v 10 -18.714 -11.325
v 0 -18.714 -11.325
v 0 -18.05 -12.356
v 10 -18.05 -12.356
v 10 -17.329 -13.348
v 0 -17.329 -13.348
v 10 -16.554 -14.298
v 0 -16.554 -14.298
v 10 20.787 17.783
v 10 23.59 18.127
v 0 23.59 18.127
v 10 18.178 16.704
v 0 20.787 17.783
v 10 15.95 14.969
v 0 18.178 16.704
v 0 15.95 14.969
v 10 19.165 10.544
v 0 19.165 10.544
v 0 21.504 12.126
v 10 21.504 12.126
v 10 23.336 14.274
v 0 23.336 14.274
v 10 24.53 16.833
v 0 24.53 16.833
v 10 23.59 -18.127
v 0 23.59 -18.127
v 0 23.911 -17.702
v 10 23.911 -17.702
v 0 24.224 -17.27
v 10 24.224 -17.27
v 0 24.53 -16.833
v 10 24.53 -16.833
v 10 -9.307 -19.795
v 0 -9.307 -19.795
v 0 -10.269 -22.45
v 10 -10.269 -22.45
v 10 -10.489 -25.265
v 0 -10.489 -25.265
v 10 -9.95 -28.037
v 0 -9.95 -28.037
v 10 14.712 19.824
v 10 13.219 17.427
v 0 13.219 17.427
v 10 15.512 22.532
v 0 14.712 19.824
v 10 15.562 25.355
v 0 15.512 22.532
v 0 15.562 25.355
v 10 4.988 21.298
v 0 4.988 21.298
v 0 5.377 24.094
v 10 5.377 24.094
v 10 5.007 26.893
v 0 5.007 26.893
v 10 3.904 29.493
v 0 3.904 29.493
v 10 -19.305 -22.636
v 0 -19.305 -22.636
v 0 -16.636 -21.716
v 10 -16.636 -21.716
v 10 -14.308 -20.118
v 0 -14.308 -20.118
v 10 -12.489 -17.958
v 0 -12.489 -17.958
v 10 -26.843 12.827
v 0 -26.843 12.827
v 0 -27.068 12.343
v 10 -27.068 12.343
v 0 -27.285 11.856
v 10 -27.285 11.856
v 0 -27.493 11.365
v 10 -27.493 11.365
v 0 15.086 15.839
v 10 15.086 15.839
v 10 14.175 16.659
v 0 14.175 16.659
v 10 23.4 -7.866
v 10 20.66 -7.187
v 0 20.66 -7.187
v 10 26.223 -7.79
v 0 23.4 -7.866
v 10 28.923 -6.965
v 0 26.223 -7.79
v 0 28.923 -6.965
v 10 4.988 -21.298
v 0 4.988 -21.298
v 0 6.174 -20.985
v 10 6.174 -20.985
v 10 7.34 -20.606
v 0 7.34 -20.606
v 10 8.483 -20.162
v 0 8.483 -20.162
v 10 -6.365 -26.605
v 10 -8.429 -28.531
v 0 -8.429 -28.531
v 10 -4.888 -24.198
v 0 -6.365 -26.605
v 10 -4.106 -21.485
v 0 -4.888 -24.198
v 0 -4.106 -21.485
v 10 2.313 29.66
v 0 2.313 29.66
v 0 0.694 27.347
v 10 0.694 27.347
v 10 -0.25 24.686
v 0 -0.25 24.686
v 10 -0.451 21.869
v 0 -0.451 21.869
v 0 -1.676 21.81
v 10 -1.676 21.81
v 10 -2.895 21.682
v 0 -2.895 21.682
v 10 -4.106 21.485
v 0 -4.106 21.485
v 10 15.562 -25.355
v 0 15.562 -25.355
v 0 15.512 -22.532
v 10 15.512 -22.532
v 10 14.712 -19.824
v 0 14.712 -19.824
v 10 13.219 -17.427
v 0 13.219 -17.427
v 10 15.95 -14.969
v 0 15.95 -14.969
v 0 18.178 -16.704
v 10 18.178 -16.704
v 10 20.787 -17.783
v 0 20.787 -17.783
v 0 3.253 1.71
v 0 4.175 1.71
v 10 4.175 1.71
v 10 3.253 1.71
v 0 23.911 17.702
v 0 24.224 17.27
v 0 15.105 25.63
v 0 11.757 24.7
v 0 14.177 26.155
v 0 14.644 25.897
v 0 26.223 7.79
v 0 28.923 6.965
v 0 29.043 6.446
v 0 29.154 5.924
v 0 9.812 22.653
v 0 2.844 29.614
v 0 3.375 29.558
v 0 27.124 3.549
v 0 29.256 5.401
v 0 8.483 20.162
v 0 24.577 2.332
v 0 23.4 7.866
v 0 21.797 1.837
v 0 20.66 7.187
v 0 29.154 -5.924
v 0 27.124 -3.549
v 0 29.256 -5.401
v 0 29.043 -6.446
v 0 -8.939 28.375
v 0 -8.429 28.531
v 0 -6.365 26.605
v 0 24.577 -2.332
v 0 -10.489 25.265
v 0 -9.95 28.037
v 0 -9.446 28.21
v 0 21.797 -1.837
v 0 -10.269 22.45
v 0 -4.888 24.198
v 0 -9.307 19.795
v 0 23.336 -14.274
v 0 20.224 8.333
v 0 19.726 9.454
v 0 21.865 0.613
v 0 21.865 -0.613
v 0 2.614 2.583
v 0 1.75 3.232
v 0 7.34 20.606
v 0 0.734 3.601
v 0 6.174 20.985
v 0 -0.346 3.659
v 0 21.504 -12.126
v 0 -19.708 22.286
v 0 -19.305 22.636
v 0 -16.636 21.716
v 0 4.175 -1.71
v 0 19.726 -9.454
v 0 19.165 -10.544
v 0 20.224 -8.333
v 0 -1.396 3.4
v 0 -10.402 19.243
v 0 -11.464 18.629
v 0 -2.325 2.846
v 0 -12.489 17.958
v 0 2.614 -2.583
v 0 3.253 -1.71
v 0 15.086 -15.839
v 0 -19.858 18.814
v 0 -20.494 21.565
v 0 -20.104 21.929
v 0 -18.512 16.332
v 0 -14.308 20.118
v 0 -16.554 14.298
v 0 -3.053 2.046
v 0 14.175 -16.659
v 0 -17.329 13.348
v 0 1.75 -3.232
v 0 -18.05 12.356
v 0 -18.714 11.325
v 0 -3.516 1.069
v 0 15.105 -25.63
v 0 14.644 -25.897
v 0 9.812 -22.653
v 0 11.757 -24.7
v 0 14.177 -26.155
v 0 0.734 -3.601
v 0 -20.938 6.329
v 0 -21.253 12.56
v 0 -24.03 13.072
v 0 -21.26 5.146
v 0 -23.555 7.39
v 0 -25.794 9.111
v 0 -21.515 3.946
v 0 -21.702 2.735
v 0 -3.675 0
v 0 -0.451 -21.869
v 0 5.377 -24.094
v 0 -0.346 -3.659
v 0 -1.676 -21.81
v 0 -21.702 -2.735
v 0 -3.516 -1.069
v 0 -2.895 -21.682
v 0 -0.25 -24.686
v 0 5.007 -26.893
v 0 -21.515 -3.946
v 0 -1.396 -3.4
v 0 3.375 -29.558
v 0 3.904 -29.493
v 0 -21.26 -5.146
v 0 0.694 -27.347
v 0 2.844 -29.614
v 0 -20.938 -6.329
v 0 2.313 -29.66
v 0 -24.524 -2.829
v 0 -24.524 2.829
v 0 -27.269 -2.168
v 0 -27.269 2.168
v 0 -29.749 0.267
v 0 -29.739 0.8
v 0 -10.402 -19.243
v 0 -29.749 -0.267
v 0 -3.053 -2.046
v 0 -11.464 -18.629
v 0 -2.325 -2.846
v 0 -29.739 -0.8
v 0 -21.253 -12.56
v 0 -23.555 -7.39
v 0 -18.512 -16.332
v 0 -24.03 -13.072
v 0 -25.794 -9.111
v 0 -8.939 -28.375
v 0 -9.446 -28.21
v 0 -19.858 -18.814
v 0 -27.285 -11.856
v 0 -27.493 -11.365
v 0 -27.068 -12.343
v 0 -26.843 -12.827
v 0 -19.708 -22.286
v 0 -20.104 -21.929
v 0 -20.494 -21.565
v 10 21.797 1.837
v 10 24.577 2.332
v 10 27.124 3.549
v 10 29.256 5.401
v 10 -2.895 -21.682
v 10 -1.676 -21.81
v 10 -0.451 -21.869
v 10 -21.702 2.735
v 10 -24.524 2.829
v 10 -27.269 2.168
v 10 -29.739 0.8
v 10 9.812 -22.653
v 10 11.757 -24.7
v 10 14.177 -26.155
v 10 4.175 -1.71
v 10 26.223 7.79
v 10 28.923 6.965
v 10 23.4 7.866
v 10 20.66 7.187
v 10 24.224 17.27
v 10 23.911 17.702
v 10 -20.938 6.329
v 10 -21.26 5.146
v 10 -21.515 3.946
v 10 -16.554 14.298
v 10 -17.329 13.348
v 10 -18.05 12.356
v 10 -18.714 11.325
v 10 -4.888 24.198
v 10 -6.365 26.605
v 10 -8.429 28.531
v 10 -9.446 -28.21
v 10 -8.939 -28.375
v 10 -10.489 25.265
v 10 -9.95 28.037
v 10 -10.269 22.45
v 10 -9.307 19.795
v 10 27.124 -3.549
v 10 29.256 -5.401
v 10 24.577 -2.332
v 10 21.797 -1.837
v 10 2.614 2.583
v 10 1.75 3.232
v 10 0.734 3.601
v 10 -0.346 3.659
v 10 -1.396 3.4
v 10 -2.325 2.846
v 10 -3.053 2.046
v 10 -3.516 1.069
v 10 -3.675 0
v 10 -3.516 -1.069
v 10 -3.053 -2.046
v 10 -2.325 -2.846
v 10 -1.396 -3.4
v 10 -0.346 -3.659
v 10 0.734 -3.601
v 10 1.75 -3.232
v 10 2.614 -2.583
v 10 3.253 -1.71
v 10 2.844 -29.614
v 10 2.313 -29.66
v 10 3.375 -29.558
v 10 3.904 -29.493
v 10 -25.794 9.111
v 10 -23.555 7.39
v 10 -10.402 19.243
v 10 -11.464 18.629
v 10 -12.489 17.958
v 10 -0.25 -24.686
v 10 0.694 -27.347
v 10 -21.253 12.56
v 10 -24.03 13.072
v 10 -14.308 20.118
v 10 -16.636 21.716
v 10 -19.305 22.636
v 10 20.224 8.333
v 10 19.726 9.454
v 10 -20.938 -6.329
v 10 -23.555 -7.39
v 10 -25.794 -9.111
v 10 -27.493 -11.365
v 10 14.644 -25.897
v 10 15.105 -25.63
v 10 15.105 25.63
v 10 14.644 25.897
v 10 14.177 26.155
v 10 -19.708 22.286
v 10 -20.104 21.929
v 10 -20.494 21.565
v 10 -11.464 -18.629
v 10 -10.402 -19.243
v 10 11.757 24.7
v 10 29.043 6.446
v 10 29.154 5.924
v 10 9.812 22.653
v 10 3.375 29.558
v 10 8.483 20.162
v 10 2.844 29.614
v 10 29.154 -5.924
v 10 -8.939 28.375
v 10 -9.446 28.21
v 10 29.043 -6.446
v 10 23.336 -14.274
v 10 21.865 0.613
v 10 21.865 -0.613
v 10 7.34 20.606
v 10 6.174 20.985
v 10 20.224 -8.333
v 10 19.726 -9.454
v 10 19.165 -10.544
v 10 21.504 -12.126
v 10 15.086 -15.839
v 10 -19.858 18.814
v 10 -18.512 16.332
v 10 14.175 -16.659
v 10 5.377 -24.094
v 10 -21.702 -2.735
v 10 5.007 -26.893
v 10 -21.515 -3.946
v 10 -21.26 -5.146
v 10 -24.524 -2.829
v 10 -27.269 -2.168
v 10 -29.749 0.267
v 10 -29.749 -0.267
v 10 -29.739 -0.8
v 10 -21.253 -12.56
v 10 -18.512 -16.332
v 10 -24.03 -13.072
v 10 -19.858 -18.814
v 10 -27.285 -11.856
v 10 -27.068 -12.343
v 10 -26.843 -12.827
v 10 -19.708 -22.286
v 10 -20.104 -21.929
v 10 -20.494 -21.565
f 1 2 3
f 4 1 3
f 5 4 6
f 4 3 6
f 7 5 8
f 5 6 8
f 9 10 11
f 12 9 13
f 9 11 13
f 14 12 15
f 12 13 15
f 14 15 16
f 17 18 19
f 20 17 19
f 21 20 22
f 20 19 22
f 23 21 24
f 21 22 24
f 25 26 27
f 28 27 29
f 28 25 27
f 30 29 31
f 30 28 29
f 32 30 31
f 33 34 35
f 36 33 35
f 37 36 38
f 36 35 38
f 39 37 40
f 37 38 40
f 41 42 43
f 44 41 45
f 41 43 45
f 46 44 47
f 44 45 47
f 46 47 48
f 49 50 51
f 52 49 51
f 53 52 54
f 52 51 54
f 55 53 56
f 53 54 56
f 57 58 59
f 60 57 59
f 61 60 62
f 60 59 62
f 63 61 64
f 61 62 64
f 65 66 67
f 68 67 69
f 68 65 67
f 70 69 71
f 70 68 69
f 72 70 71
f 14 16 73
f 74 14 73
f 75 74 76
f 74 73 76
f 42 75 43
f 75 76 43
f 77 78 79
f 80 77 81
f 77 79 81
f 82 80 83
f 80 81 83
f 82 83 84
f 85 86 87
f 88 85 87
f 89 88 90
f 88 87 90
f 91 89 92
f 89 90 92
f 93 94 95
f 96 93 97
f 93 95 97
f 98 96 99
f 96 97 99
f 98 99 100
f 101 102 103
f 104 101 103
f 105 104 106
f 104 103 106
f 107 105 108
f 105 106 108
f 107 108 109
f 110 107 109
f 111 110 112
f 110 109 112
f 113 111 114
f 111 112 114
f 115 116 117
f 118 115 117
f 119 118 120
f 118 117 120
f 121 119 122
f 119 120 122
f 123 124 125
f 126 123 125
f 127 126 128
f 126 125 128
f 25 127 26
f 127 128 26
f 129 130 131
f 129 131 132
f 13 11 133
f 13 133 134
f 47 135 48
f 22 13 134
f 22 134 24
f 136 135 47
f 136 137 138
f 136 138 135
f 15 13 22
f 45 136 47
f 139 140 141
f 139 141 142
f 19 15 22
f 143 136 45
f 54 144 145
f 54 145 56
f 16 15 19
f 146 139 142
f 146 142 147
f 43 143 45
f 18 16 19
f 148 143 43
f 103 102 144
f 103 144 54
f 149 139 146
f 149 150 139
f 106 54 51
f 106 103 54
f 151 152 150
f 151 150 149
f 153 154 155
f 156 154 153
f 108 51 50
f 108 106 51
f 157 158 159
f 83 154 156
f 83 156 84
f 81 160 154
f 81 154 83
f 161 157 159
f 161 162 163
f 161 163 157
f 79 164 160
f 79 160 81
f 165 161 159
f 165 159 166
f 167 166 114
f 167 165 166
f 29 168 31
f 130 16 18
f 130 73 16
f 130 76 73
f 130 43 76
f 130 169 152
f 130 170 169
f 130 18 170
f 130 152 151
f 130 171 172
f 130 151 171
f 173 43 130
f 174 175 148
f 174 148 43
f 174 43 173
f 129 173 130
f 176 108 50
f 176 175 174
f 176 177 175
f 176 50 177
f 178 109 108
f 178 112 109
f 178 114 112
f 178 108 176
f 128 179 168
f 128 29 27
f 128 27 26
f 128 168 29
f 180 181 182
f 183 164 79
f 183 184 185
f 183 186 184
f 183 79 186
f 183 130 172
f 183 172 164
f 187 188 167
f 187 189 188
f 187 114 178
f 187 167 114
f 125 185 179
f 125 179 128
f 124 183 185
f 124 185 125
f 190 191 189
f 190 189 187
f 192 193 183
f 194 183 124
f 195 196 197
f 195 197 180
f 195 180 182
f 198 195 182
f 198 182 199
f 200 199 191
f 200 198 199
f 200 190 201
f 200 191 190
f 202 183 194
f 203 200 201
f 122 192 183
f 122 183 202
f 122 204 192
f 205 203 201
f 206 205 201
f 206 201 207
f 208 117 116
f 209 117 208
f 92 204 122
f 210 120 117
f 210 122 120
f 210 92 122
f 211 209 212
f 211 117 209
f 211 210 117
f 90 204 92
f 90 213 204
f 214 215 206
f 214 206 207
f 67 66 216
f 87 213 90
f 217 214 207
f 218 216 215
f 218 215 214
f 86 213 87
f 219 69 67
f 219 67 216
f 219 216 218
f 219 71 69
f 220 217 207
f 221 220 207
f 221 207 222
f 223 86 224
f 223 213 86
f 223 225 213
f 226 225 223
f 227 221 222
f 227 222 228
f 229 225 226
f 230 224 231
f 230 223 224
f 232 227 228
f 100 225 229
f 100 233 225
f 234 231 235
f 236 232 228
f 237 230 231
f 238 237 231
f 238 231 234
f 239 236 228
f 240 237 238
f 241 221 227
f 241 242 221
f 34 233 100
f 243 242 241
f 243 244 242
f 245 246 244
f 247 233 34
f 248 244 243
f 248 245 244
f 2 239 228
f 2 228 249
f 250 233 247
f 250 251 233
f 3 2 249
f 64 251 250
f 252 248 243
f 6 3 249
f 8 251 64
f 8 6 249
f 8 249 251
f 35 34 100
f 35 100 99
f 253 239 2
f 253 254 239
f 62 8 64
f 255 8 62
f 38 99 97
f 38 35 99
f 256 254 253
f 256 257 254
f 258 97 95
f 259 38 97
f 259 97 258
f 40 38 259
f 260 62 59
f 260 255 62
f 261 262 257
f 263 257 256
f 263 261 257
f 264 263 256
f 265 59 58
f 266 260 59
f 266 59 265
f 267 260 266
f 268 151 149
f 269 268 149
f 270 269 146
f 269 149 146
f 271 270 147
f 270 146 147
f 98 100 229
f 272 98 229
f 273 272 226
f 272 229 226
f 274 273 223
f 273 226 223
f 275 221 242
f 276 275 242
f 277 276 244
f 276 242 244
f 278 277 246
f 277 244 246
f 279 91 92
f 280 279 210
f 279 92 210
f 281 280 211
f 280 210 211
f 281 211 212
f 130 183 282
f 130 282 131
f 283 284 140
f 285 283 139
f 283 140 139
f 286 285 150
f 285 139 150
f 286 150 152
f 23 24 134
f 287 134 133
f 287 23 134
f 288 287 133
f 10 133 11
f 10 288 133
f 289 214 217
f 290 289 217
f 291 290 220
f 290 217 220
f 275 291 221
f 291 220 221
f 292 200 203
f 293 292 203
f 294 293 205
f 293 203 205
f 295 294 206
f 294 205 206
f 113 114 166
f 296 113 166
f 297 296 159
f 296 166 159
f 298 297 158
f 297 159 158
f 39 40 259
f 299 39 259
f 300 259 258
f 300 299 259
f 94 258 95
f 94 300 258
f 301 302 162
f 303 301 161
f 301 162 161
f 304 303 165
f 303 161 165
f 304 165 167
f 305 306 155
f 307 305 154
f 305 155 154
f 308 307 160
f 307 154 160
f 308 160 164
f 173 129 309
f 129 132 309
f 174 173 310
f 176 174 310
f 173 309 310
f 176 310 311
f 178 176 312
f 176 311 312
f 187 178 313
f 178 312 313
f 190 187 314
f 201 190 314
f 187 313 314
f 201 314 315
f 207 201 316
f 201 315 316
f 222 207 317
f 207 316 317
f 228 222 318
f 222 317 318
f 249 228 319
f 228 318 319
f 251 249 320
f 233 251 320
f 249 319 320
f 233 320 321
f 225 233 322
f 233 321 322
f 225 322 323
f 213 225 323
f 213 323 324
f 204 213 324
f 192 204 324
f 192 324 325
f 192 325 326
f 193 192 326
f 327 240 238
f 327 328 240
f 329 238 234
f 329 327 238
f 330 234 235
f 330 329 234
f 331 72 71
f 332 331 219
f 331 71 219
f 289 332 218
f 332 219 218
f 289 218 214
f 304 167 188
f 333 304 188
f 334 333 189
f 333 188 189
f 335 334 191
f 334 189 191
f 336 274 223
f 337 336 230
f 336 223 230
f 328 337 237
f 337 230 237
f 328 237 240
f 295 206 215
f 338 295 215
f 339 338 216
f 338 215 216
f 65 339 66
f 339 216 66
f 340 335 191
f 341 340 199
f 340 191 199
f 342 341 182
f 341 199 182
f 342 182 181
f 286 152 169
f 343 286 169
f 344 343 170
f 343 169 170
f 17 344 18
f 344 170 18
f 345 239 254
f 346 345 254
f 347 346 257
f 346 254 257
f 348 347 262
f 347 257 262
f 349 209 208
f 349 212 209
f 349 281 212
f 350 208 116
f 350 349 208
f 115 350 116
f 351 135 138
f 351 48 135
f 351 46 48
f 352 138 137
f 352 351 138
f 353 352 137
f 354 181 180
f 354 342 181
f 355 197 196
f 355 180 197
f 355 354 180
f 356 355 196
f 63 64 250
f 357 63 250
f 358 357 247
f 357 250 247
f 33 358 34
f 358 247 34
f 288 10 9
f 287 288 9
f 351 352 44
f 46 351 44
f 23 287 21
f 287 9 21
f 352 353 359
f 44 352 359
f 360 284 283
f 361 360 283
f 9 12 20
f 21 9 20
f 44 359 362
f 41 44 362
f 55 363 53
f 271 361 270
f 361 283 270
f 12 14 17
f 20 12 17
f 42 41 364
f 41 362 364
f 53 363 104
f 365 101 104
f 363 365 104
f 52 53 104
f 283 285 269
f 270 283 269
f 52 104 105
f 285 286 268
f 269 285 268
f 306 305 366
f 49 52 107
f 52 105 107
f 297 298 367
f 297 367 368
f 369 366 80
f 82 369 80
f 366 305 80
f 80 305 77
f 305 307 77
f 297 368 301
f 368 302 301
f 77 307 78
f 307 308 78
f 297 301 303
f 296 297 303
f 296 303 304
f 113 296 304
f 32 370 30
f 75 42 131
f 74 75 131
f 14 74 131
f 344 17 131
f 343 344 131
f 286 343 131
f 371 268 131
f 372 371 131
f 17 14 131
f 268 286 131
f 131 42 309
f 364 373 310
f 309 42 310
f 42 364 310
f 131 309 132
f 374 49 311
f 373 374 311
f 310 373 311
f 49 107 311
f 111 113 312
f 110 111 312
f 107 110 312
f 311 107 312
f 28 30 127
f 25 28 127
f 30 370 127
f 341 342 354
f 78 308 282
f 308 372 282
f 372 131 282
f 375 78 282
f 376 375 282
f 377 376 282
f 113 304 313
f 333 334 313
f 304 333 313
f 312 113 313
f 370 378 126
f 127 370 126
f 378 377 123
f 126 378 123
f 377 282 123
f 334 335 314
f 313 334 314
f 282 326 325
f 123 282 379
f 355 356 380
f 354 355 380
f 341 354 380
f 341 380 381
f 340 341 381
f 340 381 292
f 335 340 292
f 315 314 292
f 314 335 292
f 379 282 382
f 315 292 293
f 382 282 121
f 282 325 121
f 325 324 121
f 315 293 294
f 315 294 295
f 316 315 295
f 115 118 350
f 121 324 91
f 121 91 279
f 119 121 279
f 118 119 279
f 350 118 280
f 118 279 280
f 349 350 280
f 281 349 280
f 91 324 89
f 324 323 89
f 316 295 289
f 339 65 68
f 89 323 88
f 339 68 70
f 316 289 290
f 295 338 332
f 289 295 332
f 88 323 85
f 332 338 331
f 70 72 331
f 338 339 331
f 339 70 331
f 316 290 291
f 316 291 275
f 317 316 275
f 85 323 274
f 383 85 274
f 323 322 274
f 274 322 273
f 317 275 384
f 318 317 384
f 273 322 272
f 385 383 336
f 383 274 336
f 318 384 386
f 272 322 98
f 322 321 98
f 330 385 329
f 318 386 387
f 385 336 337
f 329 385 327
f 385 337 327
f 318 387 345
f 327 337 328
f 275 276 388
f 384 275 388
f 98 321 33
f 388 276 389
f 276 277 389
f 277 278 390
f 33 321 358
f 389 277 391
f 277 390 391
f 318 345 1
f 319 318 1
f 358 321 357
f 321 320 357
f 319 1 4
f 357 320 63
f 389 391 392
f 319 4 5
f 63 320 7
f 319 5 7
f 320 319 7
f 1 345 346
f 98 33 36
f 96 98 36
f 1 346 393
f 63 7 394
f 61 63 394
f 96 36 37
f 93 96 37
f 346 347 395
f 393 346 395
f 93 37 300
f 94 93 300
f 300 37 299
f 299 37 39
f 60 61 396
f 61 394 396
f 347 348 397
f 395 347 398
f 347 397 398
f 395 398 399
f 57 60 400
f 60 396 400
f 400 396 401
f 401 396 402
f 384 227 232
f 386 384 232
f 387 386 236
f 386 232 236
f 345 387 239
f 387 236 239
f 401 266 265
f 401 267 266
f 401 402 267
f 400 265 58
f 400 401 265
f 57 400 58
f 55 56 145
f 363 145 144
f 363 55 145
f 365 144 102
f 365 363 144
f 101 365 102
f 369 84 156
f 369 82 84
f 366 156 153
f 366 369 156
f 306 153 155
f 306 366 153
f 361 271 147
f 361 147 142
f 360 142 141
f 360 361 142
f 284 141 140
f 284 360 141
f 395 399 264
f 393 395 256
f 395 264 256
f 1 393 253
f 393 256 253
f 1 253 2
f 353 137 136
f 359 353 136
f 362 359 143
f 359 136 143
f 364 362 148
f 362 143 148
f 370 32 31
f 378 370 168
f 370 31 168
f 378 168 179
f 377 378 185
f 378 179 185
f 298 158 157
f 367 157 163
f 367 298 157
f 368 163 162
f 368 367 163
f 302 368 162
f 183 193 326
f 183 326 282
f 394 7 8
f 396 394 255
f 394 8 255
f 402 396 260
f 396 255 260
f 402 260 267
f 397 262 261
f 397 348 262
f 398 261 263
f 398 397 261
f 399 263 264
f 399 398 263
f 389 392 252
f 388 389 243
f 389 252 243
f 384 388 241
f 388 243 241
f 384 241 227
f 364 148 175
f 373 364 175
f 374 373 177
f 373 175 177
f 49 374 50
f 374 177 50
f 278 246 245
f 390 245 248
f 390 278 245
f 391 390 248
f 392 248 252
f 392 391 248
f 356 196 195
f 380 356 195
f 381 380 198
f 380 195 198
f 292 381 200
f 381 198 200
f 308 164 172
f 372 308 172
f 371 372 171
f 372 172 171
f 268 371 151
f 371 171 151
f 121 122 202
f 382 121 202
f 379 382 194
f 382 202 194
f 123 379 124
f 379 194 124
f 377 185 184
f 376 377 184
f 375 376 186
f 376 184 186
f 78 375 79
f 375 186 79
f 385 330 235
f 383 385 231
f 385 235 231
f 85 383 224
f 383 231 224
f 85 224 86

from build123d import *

# Parameters (mm, degrees)
BASPROSKE_W             = 10
BASPROSKE_H             = 29.75
TOOTHCUT_DEPTH          = 44.244941901
TEETHCUTS_COUNT         = 15
TEETHCUTS_ANGLE         = 336
BORSKE_R                = 3.5
BORE_DEPTH              = 50.0000508
SKETCH1_R               = 3.675
CUT_EXTRUDE1_DEPTH      = 10
CUT_EXTRUDE2_DEPTH      = 44.183025
CUT_EXTRUDE2_DEPTH_BACK = 44.183025


with BuildPart() as part:
    # BasProSke → Base-Revolve (revolve)
    with BuildSketch(Plane(origin=(0, 0, 0), x_dir=(1, 0, 0), z_dir=(0, 1, 0)), mode=Mode.PRIVATE) as base_revolve_sk:
        with Locations((5, 14.875)):
            Rectangle(BASPROSKE_W, BASPROSKE_H)
    revolve(base_revolve_sk.sketch.rotate(Axis((-10, 0, 0), (1, 0, 0)), 180), axis=Axis((-10, 0, 0), (1, 0, 0)))

    # TooCutSke → ToothCut (cut, through all)
    with BuildSketch(Plane(origin=(0, 0, 0), x_dir=(0, 0, -1), z_dir=(1, 0, 0))):
        with BuildLine():
            ThreePointArc((1.837264636, 21.796704674), (0, 21.874), (-1.837264636, 21.796704674))
            ThreePointArc((-1.837264636, 21.796704674), (-2.861169083, 25.906231304), (-5.425297323, 29.27696354))
            ThreePointArc((-5.425297323, 29.27696354), (0, 29.7754), (5.425297323, 29.27696354))
            ThreePointArc((5.425297323, 29.27696354), (2.861169083, 25.906231304), (1.837264636, 21.796704674))
        make_face()
    toothcut = extrude(amount=TOOTHCUT_DEPTH, mode=Mode.SUBTRACT)

    # TeethCuts: ToothCut ×15 about axis
    teethcuts_axis = Axis((-10, 0, 0), (1, 0, 0))
    for i in range(1, TEETHCUTS_COUNT):
        add(toothcut.rotate(teethcuts_axis, i * TEETHCUTS_ANGLE / (TEETHCUTS_COUNT - 1)), mode=Mode.SUBTRACT)

    # BorSke → Bore (cut, symmetric)
    with BuildSketch(Plane(origin=(0, 0, 0), x_dir=(0, 0, -1), z_dir=(1, 0, 0))):
        with Locations(Location((0, 0, 0), (0, 0, 180))):
            Circle(BORSKE_R)
    extrude(amount=BORE_DEPTH, both=True, mode=Mode.SUBTRACT)

    # Sketch1 → Cut-Extrude1 (cut)
    with BuildSketch(Plane(origin=(10, 0, 0), x_dir=(0, 0, -1), z_dir=(1, 0, 0))):
        Circle(SKETCH1_R)
    extrude(amount=-CUT_EXTRUDE1_DEPTH, mode=Mode.SUBTRACT)

    # Sketch2 → Cut-Extrude2 (cut, two sides: drawn at the far end of the back side and taken through both)
    with BuildSketch(Plane(origin=(10, 0, 0), x_dir=(0, 0, -1), z_dir=(1, 0, 0)).offset(-CUT_EXTRUDE2_DEPTH_BACK)):
        with BuildLine():
            Line((1.71, 3.252925606), (1.71, 3.675))
            Line((1.71, 3.675), (1.71, 4.175))
            Line((1.71, 4.175), (-1.71, 4.175))
            Line((-1.71, 4.175), (-1.71, 3.675))
            Line((-1.71, 3.675), (-1.71, 3.252925606))
            ThreePointArc((-1.71, 3.252925606), (-0.880659809, 3.567921426), (0, 3.675))
            ThreePointArc((0, 3.675), (0.880659809, 3.567921426), (1.71, 3.252925606))
        make_face()
    extrude(amount=CUT_EXTRUDE2_DEPTH + CUT_EXTRUDE2_DEPTH_BACK, mode=Mode.SUBTRACT)


solid = part.part
